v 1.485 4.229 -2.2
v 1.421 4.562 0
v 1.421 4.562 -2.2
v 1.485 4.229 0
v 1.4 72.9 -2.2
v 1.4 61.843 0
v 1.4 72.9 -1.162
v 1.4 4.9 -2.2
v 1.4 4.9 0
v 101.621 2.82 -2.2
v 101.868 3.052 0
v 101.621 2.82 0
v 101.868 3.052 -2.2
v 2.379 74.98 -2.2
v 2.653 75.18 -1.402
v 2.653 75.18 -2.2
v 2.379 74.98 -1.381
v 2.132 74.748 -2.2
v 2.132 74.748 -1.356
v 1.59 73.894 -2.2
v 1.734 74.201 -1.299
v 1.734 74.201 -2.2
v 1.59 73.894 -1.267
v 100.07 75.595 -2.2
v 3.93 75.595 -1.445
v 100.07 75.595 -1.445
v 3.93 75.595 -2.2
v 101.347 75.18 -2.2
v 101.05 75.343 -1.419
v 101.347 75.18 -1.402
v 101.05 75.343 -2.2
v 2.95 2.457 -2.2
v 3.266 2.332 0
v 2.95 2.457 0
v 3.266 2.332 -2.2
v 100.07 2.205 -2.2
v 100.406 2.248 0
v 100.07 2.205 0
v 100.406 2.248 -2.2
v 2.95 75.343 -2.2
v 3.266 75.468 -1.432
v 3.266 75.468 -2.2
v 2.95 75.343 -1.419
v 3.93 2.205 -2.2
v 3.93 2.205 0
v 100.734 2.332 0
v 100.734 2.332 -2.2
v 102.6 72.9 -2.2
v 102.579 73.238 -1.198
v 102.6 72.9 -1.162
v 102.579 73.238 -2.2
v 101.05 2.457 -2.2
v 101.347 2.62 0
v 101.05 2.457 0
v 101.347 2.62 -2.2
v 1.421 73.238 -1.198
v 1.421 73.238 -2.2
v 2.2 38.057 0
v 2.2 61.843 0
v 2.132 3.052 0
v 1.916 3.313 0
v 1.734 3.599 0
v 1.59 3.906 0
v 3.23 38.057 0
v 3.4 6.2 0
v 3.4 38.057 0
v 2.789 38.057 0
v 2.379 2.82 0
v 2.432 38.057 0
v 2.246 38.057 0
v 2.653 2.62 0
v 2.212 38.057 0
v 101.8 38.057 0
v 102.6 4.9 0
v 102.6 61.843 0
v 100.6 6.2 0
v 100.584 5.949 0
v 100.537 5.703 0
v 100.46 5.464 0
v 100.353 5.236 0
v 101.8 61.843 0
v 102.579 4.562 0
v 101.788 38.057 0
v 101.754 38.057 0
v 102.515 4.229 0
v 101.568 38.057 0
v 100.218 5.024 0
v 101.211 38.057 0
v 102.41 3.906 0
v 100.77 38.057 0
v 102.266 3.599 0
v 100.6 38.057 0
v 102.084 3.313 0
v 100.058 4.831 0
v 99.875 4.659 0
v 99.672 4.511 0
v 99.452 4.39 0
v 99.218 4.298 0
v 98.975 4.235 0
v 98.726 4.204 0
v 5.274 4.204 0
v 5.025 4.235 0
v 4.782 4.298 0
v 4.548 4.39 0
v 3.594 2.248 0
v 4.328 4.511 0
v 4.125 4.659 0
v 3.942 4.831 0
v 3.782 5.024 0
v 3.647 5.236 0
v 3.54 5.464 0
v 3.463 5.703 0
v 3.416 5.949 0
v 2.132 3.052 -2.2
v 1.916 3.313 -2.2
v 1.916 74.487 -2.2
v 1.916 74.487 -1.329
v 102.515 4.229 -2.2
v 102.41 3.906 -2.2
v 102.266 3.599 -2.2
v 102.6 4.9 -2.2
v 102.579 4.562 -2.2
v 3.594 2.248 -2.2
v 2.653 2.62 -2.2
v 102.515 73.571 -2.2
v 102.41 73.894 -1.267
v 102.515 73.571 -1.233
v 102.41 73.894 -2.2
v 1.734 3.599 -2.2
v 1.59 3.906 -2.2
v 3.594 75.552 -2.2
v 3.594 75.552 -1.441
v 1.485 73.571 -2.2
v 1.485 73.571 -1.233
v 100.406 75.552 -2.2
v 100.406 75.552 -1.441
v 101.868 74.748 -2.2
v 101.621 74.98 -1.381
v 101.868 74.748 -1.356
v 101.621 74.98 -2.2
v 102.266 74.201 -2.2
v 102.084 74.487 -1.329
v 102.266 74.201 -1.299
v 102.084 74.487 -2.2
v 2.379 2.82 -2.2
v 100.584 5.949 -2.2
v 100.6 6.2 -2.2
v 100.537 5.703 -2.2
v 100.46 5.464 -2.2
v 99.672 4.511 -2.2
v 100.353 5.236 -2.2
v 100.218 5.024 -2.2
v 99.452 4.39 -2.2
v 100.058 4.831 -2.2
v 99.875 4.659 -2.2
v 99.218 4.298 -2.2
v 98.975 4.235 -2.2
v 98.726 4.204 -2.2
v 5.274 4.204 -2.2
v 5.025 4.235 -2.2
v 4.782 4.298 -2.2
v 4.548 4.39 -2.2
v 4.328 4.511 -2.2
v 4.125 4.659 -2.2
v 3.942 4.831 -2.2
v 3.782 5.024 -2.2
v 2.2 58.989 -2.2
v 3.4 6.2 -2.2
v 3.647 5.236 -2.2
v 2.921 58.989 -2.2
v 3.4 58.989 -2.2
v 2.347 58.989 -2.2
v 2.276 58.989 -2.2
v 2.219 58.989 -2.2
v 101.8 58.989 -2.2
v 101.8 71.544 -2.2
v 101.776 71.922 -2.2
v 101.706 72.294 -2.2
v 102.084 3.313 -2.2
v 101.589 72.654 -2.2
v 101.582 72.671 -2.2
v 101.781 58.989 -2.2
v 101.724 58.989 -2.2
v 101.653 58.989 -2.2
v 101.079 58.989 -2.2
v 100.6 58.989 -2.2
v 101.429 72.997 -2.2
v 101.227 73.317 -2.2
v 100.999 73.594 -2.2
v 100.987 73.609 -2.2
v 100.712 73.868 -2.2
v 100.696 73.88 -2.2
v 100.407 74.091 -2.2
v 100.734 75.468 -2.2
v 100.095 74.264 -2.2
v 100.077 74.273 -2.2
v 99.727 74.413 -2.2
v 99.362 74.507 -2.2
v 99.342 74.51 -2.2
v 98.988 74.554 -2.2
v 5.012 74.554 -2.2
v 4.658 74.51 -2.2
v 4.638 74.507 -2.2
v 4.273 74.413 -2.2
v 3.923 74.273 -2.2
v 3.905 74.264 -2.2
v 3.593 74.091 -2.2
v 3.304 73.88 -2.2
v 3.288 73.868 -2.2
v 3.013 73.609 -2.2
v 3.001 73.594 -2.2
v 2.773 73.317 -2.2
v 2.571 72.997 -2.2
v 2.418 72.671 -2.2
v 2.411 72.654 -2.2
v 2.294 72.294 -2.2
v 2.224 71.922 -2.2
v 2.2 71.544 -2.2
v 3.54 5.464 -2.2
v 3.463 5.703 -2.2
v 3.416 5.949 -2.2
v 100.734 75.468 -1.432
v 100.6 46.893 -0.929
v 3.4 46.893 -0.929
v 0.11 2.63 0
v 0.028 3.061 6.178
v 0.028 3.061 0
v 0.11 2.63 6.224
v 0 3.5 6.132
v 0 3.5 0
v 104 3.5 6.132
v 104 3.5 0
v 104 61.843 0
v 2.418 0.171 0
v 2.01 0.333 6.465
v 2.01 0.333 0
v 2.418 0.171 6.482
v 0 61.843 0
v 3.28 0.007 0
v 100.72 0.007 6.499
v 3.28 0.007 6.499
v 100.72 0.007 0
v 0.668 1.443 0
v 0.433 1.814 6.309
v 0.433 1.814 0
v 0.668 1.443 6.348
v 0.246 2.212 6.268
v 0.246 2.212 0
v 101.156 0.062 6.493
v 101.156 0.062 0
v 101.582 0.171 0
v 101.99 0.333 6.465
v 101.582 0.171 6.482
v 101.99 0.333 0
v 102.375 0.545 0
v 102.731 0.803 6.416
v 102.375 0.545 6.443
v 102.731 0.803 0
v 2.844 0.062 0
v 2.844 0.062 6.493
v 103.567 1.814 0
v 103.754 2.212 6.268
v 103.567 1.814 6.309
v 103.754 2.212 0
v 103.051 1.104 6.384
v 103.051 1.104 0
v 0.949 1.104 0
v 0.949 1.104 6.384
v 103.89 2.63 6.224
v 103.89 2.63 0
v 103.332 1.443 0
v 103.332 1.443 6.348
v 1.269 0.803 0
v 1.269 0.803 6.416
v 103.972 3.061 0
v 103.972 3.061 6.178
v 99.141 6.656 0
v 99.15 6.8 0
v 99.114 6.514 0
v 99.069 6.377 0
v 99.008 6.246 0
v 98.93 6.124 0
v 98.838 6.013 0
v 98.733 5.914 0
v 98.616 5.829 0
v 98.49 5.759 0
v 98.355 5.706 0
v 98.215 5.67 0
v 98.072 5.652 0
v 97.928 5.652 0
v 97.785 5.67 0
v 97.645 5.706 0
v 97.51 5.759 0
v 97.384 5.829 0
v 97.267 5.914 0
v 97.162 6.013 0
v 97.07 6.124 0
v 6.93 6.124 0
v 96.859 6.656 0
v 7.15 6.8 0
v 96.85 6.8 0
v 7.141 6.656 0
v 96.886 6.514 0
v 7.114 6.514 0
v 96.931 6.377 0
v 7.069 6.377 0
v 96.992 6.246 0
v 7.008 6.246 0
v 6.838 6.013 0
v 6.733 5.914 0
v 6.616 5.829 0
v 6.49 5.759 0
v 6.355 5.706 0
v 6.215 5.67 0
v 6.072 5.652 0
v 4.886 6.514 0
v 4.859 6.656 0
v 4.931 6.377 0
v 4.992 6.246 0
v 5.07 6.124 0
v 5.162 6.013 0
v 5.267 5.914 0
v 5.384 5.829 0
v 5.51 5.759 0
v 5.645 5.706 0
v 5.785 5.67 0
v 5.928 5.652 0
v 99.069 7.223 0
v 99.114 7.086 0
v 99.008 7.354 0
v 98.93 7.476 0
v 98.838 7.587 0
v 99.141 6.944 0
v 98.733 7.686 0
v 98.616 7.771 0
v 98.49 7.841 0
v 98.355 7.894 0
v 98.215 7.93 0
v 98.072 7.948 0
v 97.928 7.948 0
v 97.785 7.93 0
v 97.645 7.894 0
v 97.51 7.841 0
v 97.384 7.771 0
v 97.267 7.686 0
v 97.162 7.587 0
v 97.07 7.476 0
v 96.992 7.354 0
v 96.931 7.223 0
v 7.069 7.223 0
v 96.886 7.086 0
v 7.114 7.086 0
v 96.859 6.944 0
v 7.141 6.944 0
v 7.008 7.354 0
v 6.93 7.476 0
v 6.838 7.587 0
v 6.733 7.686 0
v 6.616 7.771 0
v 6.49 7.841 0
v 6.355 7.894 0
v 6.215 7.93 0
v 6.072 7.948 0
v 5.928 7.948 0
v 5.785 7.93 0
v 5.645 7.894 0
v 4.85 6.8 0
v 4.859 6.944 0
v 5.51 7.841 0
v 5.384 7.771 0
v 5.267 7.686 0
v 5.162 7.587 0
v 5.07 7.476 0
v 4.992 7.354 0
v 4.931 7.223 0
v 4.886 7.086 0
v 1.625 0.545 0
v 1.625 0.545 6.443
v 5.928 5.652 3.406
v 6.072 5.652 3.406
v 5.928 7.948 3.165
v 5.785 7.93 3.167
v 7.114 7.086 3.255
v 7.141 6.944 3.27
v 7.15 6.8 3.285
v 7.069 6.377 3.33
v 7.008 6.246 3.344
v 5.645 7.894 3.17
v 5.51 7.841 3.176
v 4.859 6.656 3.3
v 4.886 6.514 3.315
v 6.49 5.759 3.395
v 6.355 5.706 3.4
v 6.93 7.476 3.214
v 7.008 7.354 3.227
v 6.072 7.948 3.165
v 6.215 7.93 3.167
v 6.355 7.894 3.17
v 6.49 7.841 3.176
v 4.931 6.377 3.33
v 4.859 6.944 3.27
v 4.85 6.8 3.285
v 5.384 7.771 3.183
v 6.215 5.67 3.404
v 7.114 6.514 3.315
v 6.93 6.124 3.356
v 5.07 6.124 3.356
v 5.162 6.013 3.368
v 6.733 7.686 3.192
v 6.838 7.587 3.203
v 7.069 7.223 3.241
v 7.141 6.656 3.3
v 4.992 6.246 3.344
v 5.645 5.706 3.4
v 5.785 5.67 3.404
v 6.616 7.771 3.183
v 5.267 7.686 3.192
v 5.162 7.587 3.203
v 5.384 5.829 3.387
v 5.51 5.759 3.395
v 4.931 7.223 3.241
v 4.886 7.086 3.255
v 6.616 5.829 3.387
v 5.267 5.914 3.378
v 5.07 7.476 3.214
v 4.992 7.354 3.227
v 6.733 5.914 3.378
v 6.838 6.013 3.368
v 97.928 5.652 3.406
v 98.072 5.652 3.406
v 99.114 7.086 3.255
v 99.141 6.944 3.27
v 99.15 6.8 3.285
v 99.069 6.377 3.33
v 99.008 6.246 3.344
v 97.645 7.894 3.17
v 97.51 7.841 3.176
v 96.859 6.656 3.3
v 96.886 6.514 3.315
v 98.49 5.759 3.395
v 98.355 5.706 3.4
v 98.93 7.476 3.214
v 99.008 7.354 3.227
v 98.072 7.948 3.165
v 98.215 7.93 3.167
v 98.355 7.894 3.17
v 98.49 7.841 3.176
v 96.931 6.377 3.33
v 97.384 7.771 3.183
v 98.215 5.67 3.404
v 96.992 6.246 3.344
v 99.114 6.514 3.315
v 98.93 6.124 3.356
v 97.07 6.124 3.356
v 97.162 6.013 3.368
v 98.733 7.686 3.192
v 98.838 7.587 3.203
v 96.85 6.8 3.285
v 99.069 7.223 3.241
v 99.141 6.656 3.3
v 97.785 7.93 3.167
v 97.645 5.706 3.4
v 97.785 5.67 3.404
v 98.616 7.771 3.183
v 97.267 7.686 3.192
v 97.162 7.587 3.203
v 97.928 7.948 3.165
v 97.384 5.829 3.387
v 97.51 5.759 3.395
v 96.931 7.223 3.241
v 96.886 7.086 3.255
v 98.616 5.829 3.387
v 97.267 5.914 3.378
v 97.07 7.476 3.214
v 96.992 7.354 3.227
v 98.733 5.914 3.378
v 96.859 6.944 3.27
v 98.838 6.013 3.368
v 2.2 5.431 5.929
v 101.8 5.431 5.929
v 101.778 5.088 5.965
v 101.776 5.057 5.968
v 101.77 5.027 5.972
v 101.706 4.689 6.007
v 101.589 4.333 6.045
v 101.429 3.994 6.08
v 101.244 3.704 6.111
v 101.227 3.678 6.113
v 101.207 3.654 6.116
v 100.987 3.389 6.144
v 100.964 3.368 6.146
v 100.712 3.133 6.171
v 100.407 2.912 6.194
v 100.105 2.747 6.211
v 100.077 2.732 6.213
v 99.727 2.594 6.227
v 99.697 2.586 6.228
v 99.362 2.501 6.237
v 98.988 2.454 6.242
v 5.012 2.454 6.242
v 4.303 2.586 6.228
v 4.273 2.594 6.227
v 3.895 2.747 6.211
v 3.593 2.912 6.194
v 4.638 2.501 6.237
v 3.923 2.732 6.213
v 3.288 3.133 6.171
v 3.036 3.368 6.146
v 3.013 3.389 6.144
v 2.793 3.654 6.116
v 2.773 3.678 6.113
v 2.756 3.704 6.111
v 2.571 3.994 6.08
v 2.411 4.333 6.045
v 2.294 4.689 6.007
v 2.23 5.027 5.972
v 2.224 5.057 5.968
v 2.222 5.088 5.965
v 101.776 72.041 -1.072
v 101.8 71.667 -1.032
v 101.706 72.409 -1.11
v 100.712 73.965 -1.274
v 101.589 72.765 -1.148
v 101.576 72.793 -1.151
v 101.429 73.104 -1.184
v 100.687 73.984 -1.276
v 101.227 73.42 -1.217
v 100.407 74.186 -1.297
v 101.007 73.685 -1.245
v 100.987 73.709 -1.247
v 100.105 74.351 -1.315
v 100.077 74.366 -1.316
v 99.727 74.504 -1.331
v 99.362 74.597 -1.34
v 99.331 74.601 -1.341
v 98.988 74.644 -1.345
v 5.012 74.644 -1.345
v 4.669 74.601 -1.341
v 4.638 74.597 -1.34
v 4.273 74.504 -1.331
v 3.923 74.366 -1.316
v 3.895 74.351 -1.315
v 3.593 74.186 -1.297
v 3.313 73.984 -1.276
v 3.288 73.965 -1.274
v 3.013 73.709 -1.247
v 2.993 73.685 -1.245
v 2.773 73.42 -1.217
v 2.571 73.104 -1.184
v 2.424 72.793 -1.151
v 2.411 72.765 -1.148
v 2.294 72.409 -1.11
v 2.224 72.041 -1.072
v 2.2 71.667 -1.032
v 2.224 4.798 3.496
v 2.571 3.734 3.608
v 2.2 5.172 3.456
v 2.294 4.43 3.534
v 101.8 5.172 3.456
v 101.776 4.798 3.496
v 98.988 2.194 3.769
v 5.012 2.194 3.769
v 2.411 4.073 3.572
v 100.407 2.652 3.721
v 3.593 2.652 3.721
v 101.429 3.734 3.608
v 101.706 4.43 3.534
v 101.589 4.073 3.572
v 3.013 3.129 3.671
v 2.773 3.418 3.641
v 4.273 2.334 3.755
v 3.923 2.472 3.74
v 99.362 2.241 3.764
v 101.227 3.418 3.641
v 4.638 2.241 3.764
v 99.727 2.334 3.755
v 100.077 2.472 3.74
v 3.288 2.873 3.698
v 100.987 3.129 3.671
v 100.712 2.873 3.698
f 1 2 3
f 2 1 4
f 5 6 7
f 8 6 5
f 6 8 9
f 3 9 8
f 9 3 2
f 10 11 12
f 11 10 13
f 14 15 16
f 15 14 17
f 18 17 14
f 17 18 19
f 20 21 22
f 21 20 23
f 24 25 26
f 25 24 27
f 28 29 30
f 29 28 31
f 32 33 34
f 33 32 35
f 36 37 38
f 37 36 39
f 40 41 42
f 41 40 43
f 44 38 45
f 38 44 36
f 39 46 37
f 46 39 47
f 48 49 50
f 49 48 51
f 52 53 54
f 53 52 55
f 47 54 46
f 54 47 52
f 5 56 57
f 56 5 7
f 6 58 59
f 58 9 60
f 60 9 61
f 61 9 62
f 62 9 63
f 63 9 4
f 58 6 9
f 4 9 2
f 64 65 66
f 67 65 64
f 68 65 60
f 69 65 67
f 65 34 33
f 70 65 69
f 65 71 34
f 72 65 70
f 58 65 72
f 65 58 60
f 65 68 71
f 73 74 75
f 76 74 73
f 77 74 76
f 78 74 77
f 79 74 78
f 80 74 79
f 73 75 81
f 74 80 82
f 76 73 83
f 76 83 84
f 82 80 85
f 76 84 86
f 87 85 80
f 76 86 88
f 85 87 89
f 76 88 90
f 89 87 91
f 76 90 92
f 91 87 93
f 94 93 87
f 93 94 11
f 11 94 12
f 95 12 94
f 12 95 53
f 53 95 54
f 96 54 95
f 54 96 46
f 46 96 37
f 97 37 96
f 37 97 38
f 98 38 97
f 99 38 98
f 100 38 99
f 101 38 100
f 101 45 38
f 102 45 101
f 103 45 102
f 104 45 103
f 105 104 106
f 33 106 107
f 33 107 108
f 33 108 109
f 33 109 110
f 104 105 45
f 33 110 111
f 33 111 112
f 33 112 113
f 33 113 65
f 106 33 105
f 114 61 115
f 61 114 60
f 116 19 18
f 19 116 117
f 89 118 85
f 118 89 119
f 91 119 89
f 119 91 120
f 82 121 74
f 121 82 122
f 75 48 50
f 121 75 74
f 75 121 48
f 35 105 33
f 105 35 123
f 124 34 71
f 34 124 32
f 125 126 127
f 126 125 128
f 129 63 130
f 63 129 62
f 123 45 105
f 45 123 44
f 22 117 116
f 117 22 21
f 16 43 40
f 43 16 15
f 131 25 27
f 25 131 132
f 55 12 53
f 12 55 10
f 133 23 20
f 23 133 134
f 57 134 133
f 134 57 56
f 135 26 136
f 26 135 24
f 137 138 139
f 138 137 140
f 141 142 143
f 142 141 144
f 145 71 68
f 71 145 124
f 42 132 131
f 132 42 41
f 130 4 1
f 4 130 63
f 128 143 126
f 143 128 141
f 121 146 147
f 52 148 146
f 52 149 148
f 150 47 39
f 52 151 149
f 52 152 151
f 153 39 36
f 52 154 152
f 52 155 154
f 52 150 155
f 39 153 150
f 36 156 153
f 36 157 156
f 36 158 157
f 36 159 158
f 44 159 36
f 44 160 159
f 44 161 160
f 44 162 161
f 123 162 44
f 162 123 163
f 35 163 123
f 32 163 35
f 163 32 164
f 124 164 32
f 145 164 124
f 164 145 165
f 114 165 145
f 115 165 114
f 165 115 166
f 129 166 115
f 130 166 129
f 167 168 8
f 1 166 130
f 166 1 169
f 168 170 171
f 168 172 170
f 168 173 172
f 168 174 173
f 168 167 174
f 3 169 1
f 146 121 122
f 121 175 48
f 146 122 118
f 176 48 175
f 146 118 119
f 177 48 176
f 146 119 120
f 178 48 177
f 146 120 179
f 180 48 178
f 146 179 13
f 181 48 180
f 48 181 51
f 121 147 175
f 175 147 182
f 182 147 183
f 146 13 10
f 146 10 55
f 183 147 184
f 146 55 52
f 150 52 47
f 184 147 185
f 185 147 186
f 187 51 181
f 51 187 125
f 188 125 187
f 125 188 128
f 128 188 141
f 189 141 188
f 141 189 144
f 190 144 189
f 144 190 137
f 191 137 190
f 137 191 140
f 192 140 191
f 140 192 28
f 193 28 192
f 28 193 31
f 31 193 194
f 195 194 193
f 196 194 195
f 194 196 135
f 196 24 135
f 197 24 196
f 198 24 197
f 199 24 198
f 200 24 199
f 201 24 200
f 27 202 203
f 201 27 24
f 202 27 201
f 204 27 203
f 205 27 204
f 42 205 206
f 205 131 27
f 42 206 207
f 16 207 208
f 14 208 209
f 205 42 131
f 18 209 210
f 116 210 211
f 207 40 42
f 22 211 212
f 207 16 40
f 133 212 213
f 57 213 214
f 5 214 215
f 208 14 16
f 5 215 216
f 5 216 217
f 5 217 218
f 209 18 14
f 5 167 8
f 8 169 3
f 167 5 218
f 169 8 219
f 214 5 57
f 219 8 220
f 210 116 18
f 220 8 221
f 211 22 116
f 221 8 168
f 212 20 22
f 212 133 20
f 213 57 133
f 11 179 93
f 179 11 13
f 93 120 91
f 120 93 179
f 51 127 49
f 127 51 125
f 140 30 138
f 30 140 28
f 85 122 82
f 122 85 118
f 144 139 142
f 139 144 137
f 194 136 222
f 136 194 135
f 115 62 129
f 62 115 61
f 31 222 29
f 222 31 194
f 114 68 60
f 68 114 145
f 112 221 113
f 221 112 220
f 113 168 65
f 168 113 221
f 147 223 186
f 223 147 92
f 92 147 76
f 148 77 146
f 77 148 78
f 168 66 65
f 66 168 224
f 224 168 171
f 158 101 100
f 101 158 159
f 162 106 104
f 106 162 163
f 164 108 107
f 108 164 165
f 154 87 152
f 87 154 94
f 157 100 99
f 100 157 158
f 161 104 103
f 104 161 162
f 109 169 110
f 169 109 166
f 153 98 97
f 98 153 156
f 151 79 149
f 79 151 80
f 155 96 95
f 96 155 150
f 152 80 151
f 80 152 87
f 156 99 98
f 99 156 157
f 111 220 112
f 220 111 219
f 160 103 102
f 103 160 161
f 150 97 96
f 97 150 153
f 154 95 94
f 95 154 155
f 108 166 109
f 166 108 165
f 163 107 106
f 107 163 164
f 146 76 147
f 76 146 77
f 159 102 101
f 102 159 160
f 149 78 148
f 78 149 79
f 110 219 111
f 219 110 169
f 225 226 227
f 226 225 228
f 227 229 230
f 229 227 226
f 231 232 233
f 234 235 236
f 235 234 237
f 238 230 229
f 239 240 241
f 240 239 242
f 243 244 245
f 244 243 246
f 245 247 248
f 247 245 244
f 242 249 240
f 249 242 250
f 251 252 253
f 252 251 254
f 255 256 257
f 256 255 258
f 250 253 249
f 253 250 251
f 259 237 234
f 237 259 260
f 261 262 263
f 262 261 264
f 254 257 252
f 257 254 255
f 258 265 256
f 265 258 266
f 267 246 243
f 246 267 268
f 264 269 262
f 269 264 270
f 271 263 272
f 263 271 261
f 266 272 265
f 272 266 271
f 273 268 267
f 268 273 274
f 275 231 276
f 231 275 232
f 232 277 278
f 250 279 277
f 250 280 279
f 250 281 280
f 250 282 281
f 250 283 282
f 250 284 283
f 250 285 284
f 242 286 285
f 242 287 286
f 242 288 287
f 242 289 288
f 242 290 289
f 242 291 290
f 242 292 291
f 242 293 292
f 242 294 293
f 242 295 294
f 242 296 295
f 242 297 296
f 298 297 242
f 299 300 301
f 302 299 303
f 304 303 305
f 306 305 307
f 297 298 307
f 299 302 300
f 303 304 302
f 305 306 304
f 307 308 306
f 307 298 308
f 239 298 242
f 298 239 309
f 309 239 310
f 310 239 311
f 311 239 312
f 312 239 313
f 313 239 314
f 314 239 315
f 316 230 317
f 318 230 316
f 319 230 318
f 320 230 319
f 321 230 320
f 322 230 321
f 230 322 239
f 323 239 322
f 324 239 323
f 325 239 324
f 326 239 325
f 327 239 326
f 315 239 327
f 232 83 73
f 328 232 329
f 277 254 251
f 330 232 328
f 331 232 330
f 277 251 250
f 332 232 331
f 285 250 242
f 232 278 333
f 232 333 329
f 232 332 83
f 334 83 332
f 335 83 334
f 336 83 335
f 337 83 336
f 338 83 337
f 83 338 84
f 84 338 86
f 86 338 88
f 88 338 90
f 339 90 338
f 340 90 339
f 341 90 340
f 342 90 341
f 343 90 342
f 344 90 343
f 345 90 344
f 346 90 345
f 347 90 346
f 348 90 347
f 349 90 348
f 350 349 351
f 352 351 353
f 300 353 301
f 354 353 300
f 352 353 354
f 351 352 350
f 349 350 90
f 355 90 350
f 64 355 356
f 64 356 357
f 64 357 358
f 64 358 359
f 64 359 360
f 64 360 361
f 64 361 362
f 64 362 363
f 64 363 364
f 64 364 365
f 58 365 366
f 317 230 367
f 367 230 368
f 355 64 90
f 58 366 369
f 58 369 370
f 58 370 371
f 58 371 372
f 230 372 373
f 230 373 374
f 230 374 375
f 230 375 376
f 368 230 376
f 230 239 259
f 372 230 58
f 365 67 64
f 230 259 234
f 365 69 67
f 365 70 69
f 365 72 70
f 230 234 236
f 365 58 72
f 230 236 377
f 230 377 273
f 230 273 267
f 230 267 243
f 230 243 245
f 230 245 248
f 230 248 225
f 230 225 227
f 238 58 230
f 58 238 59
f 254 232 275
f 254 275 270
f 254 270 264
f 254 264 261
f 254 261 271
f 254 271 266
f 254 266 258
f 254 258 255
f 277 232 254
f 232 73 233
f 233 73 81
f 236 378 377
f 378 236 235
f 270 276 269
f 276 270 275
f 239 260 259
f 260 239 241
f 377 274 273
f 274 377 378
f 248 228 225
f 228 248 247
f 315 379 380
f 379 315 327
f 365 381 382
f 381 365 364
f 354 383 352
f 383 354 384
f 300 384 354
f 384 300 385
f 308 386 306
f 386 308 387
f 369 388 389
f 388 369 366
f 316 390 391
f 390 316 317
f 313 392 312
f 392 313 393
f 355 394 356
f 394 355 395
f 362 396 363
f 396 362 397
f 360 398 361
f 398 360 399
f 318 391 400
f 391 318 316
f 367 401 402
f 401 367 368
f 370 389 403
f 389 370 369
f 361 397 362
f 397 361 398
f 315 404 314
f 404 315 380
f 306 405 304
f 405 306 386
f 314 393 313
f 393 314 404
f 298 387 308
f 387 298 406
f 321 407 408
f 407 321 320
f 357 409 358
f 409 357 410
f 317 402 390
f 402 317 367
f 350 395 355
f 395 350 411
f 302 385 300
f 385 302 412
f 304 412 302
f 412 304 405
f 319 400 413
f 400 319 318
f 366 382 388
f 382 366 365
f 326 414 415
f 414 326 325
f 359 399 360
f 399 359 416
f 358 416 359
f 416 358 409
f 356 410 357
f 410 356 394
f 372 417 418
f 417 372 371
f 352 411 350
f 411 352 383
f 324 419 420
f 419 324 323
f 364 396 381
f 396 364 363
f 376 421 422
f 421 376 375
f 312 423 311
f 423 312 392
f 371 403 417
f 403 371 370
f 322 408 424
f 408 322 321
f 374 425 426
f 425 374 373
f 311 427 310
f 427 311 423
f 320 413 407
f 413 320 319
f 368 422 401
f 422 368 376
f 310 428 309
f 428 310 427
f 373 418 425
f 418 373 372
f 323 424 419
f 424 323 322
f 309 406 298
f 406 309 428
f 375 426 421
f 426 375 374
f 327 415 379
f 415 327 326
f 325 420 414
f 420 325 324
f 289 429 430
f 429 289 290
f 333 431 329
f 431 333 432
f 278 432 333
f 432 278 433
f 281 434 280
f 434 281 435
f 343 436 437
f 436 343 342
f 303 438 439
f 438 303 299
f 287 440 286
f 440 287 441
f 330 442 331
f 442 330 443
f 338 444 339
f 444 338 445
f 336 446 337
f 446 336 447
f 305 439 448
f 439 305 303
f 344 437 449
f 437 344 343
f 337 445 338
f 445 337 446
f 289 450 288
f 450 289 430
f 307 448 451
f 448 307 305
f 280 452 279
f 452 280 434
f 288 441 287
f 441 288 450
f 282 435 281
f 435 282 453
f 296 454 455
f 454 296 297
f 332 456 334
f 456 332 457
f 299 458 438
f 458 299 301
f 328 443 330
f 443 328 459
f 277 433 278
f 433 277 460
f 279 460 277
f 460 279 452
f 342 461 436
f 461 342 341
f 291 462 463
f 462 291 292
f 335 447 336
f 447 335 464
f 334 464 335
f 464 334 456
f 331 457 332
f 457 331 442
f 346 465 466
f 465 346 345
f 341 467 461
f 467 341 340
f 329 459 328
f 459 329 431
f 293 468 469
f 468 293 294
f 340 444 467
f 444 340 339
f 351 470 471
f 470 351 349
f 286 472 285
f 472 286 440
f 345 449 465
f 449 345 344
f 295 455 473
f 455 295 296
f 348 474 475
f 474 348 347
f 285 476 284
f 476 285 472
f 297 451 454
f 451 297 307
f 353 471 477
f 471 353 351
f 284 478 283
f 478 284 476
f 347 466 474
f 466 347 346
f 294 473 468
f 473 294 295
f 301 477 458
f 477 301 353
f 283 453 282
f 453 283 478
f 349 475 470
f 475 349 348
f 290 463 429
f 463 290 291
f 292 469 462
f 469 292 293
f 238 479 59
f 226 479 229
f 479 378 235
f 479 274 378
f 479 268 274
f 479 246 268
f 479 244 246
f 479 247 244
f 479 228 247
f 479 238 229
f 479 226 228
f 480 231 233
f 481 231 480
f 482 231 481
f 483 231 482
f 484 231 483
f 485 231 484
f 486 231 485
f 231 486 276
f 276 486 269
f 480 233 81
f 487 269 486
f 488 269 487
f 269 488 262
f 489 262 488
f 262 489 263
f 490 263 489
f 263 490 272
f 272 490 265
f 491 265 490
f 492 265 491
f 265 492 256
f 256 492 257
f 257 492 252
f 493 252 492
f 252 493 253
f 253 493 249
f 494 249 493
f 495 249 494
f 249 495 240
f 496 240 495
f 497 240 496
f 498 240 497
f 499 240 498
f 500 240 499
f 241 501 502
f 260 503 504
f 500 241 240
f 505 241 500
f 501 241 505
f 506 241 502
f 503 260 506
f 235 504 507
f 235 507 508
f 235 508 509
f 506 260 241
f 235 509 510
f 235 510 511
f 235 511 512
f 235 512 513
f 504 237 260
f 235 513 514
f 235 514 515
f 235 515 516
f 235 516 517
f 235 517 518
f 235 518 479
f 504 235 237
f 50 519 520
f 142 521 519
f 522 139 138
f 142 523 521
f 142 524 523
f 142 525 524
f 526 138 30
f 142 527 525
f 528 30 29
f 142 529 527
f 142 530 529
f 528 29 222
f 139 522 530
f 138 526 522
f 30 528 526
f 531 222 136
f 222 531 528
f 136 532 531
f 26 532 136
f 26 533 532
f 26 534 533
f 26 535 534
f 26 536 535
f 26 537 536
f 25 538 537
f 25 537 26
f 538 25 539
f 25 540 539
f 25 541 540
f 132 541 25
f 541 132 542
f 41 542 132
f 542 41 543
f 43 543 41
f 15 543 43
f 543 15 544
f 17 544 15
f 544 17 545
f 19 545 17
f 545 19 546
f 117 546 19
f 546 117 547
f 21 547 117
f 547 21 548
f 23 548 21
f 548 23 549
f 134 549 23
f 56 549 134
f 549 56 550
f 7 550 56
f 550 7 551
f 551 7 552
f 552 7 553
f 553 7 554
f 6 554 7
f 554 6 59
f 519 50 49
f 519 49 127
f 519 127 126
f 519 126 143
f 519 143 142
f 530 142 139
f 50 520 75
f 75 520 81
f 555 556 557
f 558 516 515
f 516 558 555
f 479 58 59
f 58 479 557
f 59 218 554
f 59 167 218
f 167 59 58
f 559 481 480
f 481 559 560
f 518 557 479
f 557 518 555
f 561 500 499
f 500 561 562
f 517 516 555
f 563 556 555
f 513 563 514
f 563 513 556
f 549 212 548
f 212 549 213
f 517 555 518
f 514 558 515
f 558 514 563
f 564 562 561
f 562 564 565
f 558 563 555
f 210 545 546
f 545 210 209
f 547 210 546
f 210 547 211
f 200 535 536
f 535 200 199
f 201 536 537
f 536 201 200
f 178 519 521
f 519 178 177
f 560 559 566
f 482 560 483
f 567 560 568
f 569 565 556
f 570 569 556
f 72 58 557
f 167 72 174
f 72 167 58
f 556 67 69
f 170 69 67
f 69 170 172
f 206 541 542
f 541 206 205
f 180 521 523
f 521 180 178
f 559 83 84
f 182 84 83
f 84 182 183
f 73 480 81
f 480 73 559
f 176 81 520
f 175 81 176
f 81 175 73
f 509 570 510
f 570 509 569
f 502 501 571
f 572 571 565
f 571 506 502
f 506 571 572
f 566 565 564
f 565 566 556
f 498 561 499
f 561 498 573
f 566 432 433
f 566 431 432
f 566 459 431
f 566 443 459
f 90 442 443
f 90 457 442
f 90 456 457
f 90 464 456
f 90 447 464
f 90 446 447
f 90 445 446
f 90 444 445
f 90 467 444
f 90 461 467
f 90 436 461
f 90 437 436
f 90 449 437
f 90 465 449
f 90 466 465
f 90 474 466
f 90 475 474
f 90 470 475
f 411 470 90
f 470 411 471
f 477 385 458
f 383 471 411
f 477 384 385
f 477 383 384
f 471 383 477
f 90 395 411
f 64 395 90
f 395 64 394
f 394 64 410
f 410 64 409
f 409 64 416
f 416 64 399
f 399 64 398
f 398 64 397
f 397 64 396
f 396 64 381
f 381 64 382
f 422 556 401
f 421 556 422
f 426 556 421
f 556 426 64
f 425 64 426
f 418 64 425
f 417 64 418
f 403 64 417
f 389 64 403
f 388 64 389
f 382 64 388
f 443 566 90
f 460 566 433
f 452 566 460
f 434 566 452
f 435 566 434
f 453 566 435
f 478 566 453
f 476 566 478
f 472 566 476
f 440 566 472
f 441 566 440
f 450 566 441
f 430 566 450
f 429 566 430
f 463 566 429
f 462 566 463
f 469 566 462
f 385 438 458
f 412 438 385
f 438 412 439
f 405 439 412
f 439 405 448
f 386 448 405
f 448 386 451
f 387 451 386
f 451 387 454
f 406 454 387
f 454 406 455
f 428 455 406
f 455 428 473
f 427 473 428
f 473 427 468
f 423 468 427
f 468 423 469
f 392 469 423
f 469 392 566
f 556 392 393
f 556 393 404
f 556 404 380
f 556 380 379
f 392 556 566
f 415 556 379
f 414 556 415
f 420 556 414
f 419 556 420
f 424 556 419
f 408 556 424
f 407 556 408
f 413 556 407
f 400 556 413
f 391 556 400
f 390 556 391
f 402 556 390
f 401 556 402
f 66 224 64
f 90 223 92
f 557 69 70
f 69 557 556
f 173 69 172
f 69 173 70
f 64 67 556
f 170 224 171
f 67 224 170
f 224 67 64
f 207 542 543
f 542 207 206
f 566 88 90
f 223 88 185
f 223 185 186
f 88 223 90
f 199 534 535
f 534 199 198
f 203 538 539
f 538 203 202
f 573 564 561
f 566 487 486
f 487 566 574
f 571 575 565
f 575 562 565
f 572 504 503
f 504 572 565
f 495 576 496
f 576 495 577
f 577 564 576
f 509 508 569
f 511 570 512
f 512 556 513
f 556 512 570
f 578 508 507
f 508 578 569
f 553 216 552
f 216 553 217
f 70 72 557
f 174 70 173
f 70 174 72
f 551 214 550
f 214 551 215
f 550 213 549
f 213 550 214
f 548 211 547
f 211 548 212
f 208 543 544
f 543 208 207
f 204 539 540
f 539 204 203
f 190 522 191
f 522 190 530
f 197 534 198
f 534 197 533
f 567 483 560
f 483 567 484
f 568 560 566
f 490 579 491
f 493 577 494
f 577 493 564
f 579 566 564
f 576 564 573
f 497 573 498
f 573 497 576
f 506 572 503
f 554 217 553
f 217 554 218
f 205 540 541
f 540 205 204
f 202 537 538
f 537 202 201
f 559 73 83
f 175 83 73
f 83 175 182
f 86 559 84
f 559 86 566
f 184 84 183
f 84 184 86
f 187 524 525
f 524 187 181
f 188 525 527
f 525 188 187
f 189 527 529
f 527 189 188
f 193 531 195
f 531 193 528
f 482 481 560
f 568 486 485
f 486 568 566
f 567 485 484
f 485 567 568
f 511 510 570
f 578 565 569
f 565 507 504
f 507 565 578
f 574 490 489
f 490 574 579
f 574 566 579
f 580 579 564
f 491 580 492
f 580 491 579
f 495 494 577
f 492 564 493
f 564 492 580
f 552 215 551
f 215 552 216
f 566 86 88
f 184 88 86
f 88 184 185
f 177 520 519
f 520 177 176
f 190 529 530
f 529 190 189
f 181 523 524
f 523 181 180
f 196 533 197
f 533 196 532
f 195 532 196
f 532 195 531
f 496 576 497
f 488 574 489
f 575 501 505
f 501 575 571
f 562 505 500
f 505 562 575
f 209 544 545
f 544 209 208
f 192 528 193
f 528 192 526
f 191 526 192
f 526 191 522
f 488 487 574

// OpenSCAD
$fn = 50;

case_w = 104.0;
case_d = 77.0;
corner_r = 3.5;

// Hagibis cradle dimensions
cradle_w = 99.6;
cradle_d = 72.6;
cradle_r = 3.0;
cradle_depth = 2.5;

// Tilt specs
tilt_angle = 6.0;
h_front_floor = 4.0; // Floor of the cradle at the very front (Y=0)
h_front_rim = h_front_floor + cradle_depth; // 6.5mm

wall_t = 2.0;
front_wall_t = 2.8;

module rounded_rect_2d(x, y, r) {
    hull() {
        translate([r, r]) circle(r=r);
        translate([x - r, r]) circle(r=r);
        translate([x - r, y - r]) circle(r=r);
        translate([r, y - r]) circle(r=r);
    }
}

module rounded_box(x, y, z, r) {
    linear_extrude(height=z) rounded_rect_2d(x, y, r);
}

module top_lid_inclined() {
    difference() {
        union() {
            // Main solid rounded block (tall enough to be sliced by 6-deg plane)
            rounded_box(case_w, case_d, 25.0, corner_r);

            // Male alignment lip sliding into base
            translate([wall_t - 0.6, front_wall_t - 0.6, -2.2])
                difference() {
                    rounded_box(case_w - 2*(wall_t - 0.6), case_d - wall_t - front_wall_t + 2*0.6, 2.2, corner_r - 0.8);
                    translate([wall_t, wall_t, -0.5])
                        rounded_box(case_w - 2*(wall_t - 0.6) - 2*wall_t, case_d - wall_t - front_wall_t + 2*0.6 - 2*wall_t, 3.0, corner_r - 1.5);
                }
        }

        // 1. Cut the top surface to the 6-degree inclined rim plane
        translate([0, 0, h_front_rim])
            rotate([-tilt_angle, 0, 0])
            translate([-10, -10, 0])
            cube([case_w + 20, case_d * 2, 40]);

        // 2. Cut the recessed cradle for the Hagibis dock (tilted at 6 degrees)
        // Centered: margin = (104 - 99.6)/2 = 2.2mm
        cradle_x = (case_w - cradle_w) / 2;
        cradle_y = (case_d - cradle_d) / 2;
        
        // We cut the pocket tilted at 6 degrees starting from h_front_floor
        translate([cradle_x, 0, h_front_floor])
            rotate([-tilt_angle, 0, 0])
            translate([0, cradle_y, 0])
            rounded_box(cradle_w, cradle_d, 30.0, cradle_r);

        // 3. Rear Cable Pass Notch (U-shaped notch on the rear rim)
        translate([case_w/2, case_d, h_front_rim + case_d*tan(tilt_angle) - 1.0])
            cube([26.0, 10.0, 6.0], center=true);

        // 4. Screw pilot holes (4 corners for M2.5)
        for (pos = [
            [wall_t + 4.0, front_wall_t + 4.0],
            [case_w - wall_t - 4.0, front_wall_t + 4.0],
            [case_w - wall_t - 4.0, case_d - wall_t - 4.5],
            [wall_t + 3.5, case_d - wall_t - 4.5]
        ]) {
            translate([pos[0], pos[1], -3])
                cylinder(d=2.3, h=10);
        }
    }
}

top_lid_inclined();
